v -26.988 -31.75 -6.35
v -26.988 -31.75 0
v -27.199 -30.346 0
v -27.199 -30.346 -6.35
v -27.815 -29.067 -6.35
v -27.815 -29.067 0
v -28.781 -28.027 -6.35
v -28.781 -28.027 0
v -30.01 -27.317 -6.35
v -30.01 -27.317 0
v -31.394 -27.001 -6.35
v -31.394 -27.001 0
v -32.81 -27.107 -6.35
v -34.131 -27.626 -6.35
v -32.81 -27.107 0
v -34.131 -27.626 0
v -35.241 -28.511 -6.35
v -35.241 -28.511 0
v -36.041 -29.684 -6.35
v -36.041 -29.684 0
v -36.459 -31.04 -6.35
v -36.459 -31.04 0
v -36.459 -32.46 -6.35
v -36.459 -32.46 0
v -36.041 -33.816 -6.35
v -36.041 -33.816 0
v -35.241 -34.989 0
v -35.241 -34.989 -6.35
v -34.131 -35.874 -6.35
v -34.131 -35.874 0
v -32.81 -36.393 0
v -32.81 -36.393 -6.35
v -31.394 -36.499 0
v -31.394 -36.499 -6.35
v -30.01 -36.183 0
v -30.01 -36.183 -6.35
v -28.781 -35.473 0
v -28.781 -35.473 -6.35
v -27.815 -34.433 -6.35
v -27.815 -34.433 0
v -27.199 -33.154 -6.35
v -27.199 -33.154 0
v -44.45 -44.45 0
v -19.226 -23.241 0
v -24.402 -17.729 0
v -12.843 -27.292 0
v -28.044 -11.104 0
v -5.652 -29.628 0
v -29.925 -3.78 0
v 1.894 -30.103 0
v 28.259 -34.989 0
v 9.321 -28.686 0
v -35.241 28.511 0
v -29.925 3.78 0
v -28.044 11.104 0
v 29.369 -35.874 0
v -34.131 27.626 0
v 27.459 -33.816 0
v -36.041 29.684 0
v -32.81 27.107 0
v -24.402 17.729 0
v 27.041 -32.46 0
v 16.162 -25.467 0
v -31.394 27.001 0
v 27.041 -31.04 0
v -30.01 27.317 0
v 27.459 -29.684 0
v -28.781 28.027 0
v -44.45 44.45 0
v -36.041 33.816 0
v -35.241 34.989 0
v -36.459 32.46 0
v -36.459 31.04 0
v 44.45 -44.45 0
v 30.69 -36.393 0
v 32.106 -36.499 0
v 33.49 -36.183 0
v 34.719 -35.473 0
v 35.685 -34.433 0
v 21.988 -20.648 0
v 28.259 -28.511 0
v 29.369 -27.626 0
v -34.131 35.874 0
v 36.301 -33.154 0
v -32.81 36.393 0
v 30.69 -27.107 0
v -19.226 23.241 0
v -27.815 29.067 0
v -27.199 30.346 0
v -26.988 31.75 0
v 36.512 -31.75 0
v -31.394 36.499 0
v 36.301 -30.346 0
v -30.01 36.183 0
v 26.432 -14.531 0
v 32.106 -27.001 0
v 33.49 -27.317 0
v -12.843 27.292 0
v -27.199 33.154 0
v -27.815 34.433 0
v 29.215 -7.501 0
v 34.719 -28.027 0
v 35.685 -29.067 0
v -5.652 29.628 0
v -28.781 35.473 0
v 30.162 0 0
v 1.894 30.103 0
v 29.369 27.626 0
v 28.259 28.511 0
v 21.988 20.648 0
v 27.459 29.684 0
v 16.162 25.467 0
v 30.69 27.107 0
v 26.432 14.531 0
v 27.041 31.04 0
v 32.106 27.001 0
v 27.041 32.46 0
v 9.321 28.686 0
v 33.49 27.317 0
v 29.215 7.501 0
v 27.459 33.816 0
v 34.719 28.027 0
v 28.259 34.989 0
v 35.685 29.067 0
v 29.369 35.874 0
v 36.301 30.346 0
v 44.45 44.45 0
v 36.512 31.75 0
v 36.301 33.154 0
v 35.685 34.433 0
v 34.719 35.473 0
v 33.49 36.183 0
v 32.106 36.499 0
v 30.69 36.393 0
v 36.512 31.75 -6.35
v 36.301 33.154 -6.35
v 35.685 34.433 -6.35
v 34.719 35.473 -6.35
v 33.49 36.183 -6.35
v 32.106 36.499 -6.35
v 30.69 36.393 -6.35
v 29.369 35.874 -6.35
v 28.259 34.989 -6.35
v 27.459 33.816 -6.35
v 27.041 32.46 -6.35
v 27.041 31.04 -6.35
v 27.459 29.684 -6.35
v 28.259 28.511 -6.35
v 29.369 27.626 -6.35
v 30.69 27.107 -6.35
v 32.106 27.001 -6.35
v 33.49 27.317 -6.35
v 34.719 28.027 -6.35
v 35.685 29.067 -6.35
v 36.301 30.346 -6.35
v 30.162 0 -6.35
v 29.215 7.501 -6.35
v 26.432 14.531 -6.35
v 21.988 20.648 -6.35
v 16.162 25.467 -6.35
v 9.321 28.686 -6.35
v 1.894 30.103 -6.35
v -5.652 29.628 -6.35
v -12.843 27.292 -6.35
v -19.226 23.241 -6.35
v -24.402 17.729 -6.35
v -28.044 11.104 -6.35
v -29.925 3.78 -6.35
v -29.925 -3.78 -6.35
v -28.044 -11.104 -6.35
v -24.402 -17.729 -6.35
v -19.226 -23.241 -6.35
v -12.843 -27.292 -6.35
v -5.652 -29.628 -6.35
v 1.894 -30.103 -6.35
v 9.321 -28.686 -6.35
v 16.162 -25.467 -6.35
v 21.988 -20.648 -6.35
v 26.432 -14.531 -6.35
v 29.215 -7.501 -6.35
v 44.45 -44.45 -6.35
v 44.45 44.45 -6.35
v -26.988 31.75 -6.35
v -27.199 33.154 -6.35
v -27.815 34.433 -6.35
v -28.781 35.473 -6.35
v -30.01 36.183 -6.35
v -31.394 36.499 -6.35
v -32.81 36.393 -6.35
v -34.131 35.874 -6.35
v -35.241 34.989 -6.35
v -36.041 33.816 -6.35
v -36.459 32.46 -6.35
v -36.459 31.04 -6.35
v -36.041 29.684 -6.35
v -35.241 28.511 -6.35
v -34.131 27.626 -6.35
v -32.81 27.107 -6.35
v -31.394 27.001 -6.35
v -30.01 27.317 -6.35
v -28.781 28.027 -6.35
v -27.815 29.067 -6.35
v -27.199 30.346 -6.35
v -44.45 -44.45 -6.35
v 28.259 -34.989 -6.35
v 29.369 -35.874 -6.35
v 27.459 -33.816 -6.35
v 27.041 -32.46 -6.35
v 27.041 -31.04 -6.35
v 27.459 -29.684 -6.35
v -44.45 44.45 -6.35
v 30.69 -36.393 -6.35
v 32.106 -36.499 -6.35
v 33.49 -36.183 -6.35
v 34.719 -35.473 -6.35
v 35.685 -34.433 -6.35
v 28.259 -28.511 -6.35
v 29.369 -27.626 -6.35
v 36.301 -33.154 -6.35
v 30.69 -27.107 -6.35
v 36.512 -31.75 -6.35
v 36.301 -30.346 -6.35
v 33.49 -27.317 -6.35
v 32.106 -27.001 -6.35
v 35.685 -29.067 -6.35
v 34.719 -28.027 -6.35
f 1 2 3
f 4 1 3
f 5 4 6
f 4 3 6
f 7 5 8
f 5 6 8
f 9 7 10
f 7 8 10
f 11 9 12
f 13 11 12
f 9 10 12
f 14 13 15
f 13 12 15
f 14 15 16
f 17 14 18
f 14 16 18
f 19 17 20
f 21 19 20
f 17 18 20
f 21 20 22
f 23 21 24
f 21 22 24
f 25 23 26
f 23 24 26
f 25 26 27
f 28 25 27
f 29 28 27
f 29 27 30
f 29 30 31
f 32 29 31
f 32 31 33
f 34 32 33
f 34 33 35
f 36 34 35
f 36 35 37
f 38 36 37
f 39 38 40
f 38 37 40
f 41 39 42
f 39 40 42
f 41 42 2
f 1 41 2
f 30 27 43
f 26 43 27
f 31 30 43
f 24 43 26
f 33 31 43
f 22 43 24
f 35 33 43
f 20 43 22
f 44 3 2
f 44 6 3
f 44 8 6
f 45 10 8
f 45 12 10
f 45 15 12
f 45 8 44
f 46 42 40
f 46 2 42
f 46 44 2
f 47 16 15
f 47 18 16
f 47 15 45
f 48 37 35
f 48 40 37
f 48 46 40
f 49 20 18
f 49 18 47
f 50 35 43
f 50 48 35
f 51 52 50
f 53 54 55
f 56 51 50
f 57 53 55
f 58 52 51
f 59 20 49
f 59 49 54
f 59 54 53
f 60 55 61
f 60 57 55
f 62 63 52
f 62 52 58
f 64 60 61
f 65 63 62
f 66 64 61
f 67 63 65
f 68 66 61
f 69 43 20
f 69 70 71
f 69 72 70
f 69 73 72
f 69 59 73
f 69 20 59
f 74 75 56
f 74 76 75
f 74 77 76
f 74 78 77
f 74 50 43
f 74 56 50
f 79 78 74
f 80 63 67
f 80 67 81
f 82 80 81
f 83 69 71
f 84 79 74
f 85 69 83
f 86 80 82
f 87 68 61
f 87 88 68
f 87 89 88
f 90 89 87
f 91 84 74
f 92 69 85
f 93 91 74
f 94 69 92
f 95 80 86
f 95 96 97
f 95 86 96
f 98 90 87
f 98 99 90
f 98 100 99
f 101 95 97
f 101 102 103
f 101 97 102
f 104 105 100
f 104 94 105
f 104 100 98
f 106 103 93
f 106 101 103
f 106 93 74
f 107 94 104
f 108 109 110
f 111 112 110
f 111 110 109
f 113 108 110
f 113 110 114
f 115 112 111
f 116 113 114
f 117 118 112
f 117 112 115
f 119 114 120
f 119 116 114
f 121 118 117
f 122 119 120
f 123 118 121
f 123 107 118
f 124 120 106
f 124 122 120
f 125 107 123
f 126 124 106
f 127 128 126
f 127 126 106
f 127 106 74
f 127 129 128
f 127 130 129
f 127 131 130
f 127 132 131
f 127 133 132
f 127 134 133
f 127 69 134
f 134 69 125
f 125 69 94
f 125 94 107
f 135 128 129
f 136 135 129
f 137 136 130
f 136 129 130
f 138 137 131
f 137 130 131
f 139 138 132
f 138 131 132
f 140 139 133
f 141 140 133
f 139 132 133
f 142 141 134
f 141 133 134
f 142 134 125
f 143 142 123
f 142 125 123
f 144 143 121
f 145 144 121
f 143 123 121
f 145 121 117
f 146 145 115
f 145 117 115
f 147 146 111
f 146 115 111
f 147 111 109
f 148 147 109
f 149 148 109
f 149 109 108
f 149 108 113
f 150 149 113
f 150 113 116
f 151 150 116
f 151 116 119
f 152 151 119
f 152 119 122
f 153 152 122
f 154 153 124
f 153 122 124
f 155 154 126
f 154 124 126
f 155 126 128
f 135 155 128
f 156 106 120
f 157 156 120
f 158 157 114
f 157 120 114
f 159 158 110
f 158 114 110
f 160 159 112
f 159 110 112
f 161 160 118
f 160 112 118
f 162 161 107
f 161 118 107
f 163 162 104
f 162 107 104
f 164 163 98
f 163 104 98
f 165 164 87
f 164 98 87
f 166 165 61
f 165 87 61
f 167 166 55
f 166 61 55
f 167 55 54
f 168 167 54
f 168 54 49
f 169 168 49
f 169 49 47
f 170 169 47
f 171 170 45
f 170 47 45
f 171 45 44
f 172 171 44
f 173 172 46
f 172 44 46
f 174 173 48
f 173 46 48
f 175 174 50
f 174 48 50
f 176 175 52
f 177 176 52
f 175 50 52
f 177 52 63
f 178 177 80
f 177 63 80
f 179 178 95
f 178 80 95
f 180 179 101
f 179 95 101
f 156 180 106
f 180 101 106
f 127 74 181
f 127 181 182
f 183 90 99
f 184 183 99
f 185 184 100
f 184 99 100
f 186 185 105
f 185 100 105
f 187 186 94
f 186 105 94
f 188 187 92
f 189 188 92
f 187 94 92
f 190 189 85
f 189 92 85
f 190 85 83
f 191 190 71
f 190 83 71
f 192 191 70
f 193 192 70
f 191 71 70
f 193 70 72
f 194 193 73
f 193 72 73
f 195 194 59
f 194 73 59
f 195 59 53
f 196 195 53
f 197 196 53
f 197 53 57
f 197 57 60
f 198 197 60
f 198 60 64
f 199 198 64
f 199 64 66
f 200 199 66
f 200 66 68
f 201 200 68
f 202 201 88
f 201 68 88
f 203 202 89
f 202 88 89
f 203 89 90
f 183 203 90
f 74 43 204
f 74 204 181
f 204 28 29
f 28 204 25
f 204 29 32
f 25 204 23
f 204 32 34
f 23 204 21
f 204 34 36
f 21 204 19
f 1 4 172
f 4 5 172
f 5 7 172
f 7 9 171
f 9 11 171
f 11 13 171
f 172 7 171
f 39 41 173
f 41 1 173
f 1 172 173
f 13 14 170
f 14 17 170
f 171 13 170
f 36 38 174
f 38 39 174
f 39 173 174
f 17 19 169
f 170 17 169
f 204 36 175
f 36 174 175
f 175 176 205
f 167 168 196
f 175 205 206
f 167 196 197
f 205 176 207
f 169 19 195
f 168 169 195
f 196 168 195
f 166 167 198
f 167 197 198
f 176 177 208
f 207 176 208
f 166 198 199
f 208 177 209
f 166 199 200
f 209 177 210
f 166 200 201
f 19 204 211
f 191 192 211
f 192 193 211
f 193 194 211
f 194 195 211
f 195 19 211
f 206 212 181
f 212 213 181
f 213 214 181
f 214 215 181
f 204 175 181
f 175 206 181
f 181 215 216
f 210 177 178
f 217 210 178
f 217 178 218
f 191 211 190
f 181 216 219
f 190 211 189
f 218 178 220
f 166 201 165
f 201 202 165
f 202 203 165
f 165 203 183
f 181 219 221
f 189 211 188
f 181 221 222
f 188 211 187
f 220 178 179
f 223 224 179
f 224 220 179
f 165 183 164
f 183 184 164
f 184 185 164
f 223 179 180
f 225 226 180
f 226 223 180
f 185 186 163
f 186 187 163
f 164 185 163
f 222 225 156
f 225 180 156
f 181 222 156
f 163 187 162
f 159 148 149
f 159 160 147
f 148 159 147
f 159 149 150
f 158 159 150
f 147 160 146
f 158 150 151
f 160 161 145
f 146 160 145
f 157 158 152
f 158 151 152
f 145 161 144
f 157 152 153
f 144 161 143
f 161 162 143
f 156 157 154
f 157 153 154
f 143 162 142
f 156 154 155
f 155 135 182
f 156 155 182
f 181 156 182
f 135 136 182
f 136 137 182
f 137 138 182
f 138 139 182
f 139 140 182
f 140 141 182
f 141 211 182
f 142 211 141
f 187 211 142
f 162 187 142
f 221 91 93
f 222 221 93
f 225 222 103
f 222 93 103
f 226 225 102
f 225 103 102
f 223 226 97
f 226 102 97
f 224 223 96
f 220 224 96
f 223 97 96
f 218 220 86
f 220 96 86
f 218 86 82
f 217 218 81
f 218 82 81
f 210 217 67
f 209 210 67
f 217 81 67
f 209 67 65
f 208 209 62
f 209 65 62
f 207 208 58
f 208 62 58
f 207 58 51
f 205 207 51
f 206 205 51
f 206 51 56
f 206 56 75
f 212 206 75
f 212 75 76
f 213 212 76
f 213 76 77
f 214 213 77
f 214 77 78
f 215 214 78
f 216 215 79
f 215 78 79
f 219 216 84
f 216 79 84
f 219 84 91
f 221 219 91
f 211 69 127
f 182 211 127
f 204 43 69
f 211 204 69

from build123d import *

# Parameters (mm, degrees)
F0_W     = 88.9
F0_H     = 88.9
F0_R     = 4.7625
F0_R_2   = 30.1625
F1_DEPTH = 6.35


with BuildPart() as f1:
    # F0 (on Top) → F1 (new body)
    with BuildSketch(Plane.XY):
        Rectangle(F0_W, F0_H)
        with Locations((-31.75, -31.75)):
            Circle(F0_R, mode=Mode.SUBTRACT)
        with Locations((31.75, -31.75)):
            Circle(F0_R, mode=Mode.SUBTRACT)
        with Locations((-31.75, 31.75)):
            Circle(F0_R, mode=Mode.SUBTRACT)
        Circle(F0_R_2, mode=Mode.SUBTRACT)
        with Locations((31.75, 31.75)):
            Circle(F0_R, mode=Mode.SUBTRACT)
    extrude(amount=-F1_DEPTH)


solid = f1.part
